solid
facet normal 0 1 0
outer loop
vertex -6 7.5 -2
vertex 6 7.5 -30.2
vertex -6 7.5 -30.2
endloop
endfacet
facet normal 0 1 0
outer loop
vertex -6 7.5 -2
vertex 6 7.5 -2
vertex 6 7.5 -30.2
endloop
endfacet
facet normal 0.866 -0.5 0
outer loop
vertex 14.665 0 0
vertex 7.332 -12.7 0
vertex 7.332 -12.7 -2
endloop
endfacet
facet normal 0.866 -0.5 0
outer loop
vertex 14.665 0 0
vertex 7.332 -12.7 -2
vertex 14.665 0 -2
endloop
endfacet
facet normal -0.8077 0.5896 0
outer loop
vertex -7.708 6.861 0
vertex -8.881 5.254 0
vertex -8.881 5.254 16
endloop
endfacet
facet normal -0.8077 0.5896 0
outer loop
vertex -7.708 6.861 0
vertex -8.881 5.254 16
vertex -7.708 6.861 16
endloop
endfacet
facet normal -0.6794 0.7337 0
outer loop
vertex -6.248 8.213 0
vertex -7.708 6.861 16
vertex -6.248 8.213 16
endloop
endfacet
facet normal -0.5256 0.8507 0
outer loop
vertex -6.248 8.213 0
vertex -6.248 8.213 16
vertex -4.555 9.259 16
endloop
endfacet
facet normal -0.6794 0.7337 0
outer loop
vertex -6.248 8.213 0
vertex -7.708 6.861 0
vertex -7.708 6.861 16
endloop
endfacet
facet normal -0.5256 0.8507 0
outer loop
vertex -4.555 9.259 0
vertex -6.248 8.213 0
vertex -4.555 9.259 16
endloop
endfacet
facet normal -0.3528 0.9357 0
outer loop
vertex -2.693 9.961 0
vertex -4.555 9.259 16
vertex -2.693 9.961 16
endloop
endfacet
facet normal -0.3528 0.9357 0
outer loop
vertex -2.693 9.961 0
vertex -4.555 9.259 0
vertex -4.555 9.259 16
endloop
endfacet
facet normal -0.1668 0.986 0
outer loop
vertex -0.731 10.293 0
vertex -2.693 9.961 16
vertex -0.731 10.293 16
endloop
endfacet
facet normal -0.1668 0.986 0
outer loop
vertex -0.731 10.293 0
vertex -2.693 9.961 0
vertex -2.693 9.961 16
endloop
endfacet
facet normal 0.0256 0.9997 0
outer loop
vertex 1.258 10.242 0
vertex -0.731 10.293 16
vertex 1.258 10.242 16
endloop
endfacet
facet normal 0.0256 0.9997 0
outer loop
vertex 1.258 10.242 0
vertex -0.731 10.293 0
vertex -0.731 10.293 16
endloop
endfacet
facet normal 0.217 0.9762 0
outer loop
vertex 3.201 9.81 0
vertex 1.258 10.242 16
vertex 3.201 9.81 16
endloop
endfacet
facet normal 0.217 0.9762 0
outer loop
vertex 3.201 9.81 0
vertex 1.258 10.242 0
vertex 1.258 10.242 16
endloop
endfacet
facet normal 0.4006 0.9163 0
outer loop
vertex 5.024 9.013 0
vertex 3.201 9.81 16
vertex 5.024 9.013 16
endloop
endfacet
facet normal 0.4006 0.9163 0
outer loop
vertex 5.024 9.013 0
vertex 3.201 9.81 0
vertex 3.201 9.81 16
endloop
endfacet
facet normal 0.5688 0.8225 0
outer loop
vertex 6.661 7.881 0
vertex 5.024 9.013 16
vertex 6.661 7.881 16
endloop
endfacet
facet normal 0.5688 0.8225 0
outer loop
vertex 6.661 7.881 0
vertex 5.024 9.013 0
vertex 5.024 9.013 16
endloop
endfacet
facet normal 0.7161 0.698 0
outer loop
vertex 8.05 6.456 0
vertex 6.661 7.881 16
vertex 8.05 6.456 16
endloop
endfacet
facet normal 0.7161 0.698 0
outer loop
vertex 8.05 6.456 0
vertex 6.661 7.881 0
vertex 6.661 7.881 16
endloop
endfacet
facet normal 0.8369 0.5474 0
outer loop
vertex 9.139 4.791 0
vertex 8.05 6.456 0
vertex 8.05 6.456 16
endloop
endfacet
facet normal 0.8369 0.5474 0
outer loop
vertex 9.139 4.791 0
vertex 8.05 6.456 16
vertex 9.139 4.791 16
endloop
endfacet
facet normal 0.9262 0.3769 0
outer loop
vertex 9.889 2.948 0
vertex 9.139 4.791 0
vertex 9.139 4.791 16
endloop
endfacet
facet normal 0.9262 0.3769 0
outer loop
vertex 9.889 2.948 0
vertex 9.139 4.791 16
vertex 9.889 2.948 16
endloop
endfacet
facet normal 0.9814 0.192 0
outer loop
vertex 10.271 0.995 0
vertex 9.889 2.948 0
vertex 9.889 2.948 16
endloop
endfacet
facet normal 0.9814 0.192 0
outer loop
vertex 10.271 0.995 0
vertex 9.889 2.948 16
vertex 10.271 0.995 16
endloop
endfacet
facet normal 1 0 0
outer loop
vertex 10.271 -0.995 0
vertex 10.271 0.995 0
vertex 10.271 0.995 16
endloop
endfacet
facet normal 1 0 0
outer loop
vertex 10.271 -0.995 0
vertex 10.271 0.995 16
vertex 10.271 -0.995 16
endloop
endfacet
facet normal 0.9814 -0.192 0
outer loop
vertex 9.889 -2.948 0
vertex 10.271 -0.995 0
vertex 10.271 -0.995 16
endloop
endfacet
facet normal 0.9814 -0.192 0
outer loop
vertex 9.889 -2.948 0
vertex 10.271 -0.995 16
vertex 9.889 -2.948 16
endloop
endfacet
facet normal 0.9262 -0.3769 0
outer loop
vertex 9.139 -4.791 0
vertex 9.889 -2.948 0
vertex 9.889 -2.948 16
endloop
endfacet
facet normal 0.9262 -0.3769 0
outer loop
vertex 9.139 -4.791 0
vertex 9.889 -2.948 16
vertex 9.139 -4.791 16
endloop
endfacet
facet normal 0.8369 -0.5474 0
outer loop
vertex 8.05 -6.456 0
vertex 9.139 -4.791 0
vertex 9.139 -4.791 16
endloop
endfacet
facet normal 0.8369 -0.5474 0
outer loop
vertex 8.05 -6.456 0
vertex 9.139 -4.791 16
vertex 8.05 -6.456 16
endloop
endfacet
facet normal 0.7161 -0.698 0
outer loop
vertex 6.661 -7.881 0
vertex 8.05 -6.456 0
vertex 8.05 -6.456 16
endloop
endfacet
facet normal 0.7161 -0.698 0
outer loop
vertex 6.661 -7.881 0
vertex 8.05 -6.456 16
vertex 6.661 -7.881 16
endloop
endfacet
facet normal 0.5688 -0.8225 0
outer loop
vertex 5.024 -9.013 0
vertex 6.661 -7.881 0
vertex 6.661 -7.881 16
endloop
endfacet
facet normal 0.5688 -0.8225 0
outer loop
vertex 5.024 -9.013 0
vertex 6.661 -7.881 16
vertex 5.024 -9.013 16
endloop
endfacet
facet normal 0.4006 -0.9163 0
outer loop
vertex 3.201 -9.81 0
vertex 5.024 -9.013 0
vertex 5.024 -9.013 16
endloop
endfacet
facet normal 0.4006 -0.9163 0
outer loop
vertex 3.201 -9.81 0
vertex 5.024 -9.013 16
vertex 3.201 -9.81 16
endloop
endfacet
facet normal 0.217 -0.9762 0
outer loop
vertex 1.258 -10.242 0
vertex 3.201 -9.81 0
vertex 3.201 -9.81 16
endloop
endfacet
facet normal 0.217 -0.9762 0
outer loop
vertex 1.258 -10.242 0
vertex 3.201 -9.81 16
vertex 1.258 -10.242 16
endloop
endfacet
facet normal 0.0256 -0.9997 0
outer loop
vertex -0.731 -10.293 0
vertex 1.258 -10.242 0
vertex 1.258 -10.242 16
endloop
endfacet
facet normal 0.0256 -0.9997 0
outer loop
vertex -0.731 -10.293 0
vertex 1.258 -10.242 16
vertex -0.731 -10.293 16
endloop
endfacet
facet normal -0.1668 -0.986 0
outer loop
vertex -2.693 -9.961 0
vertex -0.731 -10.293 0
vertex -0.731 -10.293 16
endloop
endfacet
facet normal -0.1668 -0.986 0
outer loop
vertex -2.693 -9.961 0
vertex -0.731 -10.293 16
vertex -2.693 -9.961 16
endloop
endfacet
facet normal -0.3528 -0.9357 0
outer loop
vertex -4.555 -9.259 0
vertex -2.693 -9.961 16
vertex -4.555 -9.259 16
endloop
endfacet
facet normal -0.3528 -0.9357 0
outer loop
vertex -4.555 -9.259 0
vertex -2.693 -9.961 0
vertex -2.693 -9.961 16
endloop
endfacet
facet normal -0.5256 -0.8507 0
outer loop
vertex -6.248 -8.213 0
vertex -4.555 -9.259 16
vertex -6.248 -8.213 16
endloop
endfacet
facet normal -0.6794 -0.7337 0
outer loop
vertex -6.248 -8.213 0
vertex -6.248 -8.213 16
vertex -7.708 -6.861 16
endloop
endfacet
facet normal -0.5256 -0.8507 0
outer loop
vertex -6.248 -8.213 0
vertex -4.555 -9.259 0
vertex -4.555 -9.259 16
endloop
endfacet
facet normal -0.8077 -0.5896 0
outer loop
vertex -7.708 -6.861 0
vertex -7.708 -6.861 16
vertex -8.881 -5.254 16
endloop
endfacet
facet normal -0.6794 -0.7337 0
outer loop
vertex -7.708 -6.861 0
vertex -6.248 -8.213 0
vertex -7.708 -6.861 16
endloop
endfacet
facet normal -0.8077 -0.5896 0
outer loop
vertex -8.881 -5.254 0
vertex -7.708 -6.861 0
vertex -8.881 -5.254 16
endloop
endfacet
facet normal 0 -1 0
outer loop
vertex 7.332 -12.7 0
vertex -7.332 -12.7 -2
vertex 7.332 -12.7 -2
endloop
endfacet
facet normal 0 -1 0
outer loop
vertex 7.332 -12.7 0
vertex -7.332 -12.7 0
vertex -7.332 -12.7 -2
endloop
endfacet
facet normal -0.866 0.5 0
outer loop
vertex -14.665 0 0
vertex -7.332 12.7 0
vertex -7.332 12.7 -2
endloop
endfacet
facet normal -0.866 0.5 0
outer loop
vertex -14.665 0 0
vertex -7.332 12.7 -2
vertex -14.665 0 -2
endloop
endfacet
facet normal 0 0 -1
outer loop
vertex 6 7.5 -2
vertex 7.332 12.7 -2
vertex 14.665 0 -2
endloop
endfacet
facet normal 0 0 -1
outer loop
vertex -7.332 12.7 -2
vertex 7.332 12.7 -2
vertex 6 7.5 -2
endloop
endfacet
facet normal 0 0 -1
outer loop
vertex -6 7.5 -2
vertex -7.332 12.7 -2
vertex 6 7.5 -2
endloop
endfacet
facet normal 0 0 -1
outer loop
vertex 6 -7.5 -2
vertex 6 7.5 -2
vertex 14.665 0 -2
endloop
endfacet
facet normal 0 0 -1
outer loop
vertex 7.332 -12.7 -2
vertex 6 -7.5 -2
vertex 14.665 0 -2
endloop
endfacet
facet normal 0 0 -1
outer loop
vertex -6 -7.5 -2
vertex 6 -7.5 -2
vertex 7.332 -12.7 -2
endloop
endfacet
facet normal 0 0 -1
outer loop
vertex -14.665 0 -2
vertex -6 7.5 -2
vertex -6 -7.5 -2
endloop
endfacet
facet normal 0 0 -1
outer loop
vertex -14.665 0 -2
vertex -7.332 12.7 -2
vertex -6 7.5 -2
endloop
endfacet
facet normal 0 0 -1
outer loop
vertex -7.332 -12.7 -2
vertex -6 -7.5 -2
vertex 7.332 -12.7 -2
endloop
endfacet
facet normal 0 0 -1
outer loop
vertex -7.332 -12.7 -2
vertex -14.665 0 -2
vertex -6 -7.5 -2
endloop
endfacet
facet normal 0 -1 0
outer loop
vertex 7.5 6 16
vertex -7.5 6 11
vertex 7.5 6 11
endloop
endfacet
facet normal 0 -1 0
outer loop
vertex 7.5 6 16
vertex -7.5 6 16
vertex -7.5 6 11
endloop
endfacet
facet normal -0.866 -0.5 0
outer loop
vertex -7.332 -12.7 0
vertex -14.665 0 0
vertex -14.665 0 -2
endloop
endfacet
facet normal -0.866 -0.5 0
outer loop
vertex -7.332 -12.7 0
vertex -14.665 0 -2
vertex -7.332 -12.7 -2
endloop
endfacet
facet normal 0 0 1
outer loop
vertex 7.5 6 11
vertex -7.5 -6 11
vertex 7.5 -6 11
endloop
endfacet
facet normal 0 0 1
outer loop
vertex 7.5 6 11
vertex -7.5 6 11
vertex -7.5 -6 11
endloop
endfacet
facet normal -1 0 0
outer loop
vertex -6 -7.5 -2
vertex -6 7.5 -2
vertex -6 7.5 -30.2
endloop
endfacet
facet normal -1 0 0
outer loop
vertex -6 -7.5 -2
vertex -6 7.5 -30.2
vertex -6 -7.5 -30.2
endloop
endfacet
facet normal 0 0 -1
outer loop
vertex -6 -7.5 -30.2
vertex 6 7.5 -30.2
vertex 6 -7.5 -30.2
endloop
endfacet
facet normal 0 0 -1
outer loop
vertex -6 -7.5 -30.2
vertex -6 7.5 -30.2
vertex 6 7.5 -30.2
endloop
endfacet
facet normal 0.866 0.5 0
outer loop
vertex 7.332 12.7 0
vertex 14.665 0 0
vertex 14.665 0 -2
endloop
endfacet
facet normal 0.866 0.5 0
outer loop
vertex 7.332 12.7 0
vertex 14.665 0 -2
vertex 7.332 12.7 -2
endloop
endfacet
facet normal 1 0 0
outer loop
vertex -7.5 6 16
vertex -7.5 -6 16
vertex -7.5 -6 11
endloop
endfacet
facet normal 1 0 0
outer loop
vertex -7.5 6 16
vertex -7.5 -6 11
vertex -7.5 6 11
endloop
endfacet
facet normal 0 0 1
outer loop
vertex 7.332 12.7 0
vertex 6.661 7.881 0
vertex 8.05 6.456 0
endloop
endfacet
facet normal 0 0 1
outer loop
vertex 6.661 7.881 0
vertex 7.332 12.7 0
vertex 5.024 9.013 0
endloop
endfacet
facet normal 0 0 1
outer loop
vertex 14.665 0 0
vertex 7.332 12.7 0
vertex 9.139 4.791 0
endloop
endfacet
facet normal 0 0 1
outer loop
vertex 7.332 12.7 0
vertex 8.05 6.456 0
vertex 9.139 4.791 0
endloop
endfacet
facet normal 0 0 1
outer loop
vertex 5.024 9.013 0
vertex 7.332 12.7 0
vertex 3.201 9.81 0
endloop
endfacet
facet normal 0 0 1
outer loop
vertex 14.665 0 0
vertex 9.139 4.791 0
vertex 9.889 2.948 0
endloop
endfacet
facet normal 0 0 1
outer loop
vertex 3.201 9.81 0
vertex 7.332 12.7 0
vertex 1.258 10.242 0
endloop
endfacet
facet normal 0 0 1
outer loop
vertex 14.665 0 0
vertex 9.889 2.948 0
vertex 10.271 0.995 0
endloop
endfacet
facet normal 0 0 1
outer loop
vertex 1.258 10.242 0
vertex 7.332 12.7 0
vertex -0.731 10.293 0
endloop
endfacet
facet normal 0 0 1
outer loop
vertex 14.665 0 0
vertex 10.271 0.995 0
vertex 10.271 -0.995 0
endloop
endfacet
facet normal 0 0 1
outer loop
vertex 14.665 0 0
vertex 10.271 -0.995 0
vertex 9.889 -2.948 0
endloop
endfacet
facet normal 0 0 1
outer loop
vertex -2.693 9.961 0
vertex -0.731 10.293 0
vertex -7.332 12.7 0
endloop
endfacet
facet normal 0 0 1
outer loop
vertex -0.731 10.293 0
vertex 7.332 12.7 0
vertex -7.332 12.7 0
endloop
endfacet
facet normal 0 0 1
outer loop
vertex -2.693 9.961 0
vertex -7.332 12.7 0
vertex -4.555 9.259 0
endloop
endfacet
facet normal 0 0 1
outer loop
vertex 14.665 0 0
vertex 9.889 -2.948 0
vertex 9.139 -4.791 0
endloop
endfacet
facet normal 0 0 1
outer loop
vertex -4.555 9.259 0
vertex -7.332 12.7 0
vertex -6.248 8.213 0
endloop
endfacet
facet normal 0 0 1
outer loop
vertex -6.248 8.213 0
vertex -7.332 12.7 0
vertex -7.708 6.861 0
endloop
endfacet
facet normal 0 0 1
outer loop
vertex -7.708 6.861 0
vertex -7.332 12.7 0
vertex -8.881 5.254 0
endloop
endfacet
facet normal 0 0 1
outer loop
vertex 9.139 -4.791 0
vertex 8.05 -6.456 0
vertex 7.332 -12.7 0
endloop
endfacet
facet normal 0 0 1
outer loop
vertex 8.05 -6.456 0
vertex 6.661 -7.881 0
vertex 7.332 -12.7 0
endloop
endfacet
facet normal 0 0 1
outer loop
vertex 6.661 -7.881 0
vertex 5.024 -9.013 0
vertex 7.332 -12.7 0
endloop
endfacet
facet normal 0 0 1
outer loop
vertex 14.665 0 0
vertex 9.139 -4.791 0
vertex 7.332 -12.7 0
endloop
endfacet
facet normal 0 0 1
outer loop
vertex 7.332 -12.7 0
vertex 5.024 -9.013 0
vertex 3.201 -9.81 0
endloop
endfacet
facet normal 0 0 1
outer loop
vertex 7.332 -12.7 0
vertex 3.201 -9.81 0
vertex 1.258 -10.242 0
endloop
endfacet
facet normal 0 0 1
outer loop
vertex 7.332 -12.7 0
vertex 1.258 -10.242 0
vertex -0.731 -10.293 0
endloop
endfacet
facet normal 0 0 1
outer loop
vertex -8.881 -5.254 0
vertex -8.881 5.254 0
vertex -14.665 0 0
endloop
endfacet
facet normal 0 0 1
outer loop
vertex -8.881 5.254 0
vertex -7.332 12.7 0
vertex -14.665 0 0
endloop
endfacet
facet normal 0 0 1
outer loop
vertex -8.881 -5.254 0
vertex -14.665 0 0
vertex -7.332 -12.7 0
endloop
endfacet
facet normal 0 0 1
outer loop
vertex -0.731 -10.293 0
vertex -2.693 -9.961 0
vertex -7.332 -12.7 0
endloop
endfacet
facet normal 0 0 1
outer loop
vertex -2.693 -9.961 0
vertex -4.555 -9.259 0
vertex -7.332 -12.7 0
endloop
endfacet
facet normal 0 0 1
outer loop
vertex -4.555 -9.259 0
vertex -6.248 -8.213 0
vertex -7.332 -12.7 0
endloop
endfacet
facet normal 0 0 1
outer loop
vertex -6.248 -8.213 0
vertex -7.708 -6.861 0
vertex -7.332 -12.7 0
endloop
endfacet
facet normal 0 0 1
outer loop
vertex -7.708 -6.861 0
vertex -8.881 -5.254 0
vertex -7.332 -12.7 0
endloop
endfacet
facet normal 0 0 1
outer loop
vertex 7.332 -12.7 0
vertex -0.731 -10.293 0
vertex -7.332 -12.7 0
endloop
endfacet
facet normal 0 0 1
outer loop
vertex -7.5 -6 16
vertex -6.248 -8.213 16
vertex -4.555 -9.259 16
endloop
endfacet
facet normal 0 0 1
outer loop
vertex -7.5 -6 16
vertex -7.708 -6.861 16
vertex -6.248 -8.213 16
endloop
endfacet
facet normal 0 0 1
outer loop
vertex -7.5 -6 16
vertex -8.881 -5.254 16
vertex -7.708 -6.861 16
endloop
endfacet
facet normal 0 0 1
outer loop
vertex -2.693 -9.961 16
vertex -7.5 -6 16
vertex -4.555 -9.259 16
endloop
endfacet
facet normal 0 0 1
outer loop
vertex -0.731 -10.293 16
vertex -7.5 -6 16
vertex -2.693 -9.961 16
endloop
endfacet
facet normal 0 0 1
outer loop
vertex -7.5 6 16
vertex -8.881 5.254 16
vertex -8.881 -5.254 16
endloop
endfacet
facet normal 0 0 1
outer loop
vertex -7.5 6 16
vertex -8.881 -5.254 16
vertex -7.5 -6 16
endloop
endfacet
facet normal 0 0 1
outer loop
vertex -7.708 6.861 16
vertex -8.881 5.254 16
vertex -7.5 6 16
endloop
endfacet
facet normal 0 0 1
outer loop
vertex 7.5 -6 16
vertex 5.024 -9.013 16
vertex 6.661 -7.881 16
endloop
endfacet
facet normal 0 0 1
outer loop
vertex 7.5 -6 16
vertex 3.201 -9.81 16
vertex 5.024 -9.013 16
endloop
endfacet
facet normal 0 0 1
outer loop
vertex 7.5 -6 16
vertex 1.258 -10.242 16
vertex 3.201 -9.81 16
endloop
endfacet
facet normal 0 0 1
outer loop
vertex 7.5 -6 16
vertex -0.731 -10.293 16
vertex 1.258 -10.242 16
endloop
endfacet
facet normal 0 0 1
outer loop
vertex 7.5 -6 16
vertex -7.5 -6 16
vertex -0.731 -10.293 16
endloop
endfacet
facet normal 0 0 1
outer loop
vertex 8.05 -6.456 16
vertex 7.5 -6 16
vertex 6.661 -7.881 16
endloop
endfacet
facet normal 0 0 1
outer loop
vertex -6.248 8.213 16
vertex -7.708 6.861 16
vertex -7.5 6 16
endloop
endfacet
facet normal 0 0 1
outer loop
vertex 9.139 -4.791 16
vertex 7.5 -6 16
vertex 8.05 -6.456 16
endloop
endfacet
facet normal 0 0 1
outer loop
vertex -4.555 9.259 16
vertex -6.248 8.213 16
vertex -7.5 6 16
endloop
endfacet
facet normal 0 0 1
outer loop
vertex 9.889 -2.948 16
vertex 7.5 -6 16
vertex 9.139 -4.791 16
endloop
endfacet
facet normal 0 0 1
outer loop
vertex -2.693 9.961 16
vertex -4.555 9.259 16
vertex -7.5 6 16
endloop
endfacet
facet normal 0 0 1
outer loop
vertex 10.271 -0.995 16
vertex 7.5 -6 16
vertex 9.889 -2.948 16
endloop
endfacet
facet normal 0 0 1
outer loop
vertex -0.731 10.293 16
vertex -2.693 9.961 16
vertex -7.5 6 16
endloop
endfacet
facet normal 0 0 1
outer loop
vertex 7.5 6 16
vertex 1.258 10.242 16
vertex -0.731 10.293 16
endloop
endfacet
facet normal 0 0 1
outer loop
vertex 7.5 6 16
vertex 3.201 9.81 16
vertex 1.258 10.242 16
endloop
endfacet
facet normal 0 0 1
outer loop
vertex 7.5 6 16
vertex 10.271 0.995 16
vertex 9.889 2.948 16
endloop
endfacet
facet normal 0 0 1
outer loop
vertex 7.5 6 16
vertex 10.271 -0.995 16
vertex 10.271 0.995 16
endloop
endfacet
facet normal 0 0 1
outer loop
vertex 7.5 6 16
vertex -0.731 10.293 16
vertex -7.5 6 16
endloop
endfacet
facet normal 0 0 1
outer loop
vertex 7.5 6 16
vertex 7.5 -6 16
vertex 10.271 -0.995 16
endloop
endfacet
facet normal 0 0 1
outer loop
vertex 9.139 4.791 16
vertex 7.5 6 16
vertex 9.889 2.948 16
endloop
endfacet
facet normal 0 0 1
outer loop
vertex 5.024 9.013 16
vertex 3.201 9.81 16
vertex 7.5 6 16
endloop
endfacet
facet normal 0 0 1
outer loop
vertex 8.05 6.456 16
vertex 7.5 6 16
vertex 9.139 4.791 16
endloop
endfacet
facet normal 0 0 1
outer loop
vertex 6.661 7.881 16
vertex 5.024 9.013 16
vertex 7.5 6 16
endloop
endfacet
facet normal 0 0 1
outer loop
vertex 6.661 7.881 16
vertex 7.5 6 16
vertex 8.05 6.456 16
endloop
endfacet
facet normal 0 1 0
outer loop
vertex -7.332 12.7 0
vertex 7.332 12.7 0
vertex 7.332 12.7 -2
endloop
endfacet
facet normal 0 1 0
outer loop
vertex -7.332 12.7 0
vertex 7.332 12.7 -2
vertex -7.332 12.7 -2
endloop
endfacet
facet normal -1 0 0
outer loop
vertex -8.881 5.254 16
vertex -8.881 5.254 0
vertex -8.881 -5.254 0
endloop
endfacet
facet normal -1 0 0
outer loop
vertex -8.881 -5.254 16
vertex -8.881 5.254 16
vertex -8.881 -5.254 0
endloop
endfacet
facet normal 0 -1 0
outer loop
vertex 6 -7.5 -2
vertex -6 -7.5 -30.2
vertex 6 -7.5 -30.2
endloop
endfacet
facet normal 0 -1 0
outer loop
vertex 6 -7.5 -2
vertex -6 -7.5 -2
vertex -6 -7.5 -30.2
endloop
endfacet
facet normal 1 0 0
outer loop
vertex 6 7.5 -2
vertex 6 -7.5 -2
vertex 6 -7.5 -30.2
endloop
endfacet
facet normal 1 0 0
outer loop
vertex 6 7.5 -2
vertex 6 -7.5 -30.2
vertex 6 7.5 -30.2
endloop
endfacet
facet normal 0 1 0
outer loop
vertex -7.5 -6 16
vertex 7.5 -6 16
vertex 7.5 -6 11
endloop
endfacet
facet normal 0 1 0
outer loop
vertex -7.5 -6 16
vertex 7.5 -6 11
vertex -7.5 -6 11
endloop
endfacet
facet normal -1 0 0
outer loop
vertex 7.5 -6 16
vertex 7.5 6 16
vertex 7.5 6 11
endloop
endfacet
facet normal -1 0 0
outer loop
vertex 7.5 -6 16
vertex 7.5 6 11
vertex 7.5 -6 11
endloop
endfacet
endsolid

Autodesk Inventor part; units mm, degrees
ref_plane "YZ Plane" through (0, 0, 0) normal (1, 0, 0) x (0, 1, 0)
ref_plane "XZ Plane" through (0, 0, 0) normal (0, 1, 0) x (-1, 0, 0)
ref_plane "XY Plane" through (0, 0, 0) normal (0, 0, 1) x (1, 0, 0)
sketch "Sketch1" plane through (0, 0, 0) normal (0, 0, 1) x (1, 0, 0)
  circle A0 centre (0, 0) radius 10.3188
  line L0 (-8.8812, 5.2536) -> (-8.8812, -5.2536)
  dimension "d0" = 20.6375
  dimension "d10" = 19.2
extrude "Extrusion1" add sketch "Sketch1" along normal blind 16 contours A0 L0 picked at (-2.4812, 0)
sketch "Sketch2" plane through (0, 0, 0) normal (0, 0, -1) x (0, -1, 0)
  line L0 (0, 14.6647) -> (12.7, 7.3323)
  line L1 (12.7, 7.3323) -> (12.7, -7.3323)
  line L2 (12.7, -7.3323) -> (0, -14.6647)
  line L3 (0, -14.6647) -> (-12.7, -7.3323)
  line L4 (-12.7, -7.3323) -> (-12.7, 7.3323)
  line L5 (-12.7, 7.3323) -> (0, 14.6647)
  point P0 (0, 0)
  point P1 (0, 0)
  dimension "d3" = 25.4
extrude "Extrusion2" add sketch "Sketch2" along normal blind 2
sketch "Sketch3" plane through (0, 0, -2) normal (0, 0, -1) x (0, -1, 0)
  line L0 (-7.5, 6) -> (7.5, 6)
  line L1 (7.5, 6) -> (7.5, -6)
  line L2 (7.5, -6) -> (-7.5, -6)
  line L3 (-7.5, -6) -> (-7.5, 6)
  point P0 (0, 0)
  point P1 (-7.5, 0)
  point P2 (0, 6)
  dimension "d6" = 15
  dimension "d7" = 12
extrude "Extrusion3" add sketch "Sketch3" along normal blind 28.2
thread "Thread1" size "13/16-28 UN" class "2A" standard "ANSI Unified Screw Threads" full length
sketch "Sketch4" plane through (0, 0, 16) normal (0, 0, 1) x (1, 0, 0)
  line L0 (-7.5, 6) -> (7.5, 6)
  line L1 (7.5, 6) -> (7.5, -6)
  line L2 (7.5, -6) -> (-7.5, -6)
  line L3 (-7.5, -6) -> (-7.5, 6)
  point P0 (0, 0)
  point P1 (7.5, 0)
  point P2 (0, 6)
  dimension "d13" = 15
  dimension "d14" = 12
extrude "Extrusion4" cut sketch "Sketch4" against normal blind 5
properties part number "RS PRO Single-Port RJ45 Female Coupler, Shielded"
